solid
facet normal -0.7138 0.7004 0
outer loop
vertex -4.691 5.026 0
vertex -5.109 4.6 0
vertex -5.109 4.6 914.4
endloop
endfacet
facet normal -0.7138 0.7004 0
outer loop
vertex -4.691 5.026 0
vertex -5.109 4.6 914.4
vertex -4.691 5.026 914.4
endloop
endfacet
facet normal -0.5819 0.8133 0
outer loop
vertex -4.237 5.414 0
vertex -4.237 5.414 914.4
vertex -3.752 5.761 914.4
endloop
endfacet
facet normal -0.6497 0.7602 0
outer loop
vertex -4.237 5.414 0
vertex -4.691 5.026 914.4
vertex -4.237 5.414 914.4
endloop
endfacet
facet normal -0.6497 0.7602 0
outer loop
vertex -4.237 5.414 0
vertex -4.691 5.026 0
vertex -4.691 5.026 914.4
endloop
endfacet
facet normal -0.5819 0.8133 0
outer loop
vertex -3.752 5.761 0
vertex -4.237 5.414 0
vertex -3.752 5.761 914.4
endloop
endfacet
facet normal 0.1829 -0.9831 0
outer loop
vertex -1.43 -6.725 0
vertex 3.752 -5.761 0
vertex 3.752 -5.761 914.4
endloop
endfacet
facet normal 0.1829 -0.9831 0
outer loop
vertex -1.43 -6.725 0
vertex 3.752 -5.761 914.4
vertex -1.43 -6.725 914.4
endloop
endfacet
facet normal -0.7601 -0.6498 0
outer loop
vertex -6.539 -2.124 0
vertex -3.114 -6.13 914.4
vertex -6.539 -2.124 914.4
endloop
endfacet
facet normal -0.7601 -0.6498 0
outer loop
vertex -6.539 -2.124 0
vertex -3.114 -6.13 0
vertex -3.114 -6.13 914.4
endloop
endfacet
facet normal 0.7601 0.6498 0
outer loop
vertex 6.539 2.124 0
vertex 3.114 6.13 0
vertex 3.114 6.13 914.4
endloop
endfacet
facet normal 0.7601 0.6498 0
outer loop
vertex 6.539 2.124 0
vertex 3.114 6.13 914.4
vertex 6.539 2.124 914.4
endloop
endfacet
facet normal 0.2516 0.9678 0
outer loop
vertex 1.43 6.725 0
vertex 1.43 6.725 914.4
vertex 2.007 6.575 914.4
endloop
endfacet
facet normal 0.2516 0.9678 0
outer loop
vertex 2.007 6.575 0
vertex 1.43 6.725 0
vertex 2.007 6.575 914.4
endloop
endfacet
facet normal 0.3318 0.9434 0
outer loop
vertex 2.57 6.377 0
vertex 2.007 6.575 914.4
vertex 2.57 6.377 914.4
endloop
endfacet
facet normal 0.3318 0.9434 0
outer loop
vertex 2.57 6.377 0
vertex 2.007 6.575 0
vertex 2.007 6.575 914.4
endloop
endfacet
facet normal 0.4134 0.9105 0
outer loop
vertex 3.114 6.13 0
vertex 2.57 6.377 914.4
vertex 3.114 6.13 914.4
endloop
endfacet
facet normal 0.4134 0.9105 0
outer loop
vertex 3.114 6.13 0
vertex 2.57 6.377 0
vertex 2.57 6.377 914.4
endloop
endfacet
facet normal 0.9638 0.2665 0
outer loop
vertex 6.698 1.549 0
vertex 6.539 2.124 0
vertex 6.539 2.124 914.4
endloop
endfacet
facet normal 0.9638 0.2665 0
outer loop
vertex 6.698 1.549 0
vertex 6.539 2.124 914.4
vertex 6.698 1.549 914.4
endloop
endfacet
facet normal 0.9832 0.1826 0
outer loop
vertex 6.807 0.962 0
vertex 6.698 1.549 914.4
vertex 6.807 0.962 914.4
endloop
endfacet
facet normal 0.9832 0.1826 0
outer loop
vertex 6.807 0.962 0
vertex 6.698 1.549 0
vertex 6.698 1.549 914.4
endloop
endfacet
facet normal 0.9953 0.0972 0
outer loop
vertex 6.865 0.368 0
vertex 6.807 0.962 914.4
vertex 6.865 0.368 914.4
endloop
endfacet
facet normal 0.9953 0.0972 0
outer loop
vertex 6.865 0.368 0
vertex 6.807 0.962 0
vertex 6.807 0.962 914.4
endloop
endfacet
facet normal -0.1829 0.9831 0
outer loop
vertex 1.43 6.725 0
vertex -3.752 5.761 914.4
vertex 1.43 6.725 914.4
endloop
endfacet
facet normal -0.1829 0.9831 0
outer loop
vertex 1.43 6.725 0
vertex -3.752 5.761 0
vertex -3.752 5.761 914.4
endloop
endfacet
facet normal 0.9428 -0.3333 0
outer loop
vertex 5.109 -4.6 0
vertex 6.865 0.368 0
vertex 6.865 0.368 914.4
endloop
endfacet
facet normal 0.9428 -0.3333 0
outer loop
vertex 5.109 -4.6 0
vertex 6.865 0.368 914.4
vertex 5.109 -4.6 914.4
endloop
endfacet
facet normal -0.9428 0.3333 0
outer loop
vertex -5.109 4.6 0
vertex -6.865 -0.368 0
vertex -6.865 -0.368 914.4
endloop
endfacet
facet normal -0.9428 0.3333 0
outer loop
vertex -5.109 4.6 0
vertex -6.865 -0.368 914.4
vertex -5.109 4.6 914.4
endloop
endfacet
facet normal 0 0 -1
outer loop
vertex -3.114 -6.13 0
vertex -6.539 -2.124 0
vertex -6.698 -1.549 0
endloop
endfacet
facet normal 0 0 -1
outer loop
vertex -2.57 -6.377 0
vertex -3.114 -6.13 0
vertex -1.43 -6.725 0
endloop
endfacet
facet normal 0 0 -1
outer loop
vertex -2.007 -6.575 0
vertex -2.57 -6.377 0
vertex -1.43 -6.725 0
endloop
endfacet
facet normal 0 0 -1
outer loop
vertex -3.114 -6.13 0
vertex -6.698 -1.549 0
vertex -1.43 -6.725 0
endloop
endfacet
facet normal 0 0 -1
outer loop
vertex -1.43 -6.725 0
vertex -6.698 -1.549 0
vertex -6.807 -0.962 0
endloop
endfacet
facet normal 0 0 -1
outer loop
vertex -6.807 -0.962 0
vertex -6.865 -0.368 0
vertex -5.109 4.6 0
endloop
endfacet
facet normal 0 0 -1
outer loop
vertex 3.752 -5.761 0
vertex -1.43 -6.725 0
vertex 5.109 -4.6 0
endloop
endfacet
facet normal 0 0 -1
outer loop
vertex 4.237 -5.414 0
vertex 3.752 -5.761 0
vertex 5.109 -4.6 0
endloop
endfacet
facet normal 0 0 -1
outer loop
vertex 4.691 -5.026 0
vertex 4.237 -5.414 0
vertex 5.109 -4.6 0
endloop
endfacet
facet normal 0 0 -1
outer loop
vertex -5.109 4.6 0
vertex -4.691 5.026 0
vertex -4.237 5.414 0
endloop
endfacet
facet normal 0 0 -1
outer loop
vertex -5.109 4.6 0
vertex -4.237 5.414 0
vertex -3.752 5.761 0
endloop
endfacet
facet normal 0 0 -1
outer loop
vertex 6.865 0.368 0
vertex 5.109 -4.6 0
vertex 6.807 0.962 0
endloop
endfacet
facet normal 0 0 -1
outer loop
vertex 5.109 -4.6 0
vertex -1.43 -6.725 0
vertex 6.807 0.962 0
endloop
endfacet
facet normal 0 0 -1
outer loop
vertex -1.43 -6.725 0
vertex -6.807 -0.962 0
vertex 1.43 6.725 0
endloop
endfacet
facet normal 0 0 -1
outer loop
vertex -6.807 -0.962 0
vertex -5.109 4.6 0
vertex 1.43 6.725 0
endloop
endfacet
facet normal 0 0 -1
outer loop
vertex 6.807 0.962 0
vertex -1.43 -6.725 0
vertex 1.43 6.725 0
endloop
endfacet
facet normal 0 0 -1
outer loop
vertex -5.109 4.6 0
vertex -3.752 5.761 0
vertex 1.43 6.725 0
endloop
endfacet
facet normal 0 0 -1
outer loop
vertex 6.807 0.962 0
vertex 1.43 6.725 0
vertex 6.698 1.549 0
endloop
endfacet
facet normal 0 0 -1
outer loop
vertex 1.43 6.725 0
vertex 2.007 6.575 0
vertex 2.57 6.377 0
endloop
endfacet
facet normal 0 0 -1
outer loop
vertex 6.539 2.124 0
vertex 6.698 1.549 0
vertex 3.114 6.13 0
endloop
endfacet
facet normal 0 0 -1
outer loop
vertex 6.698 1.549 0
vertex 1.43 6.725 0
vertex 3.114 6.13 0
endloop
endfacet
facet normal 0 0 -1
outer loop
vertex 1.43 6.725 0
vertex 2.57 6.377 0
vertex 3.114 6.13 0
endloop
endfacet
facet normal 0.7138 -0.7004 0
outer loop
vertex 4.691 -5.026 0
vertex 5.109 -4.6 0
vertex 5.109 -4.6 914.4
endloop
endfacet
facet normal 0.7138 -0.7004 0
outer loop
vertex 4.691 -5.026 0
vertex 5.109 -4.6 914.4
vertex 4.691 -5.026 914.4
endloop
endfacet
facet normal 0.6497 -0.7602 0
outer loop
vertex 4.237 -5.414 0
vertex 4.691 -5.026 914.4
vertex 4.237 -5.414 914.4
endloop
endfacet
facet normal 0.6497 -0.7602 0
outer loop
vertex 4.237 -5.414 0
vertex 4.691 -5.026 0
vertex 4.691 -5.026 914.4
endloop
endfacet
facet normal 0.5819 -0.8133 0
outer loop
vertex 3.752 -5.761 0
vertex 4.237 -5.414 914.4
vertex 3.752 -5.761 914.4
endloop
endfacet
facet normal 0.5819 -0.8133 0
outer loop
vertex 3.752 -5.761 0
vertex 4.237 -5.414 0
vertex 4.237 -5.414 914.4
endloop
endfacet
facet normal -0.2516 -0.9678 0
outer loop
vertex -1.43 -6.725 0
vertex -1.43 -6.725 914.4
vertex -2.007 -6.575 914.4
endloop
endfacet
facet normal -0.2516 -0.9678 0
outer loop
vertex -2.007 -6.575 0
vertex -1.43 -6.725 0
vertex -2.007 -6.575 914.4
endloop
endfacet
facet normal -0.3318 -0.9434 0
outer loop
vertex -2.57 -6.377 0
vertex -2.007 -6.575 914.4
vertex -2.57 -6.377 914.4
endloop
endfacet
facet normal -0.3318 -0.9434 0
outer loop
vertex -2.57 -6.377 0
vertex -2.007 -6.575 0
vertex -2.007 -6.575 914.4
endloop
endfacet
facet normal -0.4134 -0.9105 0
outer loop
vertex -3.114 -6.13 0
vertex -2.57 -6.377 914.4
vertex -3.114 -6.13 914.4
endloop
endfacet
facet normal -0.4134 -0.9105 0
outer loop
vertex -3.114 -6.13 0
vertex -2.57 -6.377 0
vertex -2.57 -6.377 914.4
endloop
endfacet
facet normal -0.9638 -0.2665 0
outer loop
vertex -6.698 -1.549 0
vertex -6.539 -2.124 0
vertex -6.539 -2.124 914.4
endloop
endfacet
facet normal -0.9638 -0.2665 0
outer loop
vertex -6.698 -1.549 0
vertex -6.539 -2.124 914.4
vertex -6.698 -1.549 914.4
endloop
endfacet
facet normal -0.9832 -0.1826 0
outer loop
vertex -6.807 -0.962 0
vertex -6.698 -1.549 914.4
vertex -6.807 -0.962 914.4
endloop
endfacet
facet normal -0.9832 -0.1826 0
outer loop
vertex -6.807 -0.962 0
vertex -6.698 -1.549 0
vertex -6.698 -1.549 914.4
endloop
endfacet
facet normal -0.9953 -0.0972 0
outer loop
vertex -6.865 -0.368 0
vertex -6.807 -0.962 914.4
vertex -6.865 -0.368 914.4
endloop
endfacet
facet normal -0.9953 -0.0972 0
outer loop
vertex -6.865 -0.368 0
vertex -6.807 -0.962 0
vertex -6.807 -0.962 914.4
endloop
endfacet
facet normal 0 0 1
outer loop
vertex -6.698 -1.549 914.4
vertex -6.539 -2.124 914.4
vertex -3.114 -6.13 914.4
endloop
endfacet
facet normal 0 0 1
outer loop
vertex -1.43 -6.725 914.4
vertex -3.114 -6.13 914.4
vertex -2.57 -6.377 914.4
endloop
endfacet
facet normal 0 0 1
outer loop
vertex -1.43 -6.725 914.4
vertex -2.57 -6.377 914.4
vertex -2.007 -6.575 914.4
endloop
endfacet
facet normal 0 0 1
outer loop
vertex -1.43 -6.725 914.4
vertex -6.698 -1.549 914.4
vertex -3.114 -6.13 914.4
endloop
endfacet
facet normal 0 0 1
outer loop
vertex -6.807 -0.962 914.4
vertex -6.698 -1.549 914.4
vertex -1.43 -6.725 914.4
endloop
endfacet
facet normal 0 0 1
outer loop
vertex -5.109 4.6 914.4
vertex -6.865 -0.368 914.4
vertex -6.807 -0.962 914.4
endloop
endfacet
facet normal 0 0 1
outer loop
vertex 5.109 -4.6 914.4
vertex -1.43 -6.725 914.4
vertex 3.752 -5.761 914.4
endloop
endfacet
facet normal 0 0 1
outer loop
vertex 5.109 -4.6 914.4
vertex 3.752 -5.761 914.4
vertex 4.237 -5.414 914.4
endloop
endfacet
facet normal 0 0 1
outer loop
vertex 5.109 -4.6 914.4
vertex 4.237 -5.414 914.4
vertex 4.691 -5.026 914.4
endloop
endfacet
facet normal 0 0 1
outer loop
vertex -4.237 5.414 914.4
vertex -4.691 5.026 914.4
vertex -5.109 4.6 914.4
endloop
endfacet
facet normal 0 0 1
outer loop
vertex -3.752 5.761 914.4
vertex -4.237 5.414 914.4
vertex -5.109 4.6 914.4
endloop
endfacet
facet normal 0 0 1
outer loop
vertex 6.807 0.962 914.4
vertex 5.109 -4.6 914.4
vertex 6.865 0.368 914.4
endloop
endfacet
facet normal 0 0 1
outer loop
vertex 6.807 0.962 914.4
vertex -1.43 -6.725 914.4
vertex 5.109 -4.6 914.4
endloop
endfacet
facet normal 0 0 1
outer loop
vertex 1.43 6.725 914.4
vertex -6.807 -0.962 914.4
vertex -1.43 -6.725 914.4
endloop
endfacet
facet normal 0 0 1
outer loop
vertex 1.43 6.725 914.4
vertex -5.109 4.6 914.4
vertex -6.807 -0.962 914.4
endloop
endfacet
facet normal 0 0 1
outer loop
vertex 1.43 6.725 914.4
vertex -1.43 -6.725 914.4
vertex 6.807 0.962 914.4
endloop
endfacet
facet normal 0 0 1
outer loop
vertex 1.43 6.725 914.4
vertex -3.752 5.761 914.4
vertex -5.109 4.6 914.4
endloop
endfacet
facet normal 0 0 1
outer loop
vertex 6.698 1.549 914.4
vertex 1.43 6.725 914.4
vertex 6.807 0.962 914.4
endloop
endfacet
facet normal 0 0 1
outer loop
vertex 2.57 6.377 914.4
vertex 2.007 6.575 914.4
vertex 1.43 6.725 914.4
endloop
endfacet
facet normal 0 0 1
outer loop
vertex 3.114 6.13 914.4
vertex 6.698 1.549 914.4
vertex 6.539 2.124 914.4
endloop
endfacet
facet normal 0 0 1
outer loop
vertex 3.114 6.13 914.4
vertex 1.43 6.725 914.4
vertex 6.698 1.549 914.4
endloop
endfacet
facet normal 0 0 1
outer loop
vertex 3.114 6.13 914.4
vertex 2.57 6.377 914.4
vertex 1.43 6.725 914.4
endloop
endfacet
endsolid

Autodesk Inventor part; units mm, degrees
ref_plane "YZ Plane" through (0, 0, 0) normal (1, 0, 0) x (0, 1, 0)
ref_plane "XZ Plane" through (0, 0, 0) normal (0, 1, 0) x (-1, 0, 0)
ref_plane "XY Plane" through (0, 0, 0) normal (0, 0, 1) x (1, 0, 0)
sketch "Sketch1" plane through (0, 0, 0) normal (0, 0, 1) x (1, 0, 0)
  arc A0 (-5.109, 4.6004) -> (-6.8651, -0.3684) centre (0, 0) ccw
  line L0 (-4.7654, 5.5726) -> (-3.7516, 5.7612)
  line L1 (2.4434, 6.9133) -> (3.1135, 6.1296)
  line L2 (7.2087, 1.3406) -> (6.8651, 0.3684)
  line L3 (4.7654, -5.5726) -> (3.7516, -5.7612)
  line L4 (-2.4434, -6.9133) -> (-3.1135, -6.1296)
  line L5 (-7.2087, -1.3406) -> (-6.8651, -0.3684)
  arc A1 (-3.7516, 5.7612) -> (-5.109, 4.6004) centre (0, 0) ccw
  arc A2 (1.4295, 6.7247) -> (-3.7516, 5.7612) centre (0, 0) ccw
  arc A3 (3.1135, 6.1296) -> (1.4295, 6.7247) centre (0, 0) ccw
  arc A4 (6.5386, 2.1243) -> (3.1135, 6.1296) centre (0, 0) ccw
  arc A5 (6.8651, 0.3684) -> (6.5386, 2.1243) centre (0, 0) ccw
  arc A6 (5.109, -4.6004) -> (6.8651, 0.3684) centre (0, 0) ccw
  arc A7 (3.7516, -5.7612) -> (5.109, -4.6004) centre (0, 0) ccw
  arc A8 (-1.4295, -6.7247) -> (3.7516, -5.7612) centre (0, 0) ccw
  arc A9 (-3.1135, -6.1296) -> (-1.4295, -6.7247) centre (0, 0) ccw
  arc A10 (-6.5386, -2.1243) -> (-3.1135, -6.1296) centre (0, 0) ccw
  arc A11 (-6.8651, -0.3684) -> (-6.5386, -2.1243) centre (0, 0) ccw
  line L6 (-5.109, 4.6004) -> (-4.7654, 5.5726)
  line L7 (-6.8651, -0.3684) -> (-5.109, 4.6004)
  line L8 (-6.5386, -2.1243) -> (-7.2087, -1.3406)
  line L9 (-3.1135, -6.1296) -> (-6.5386, -2.1243)
  line L10 (-1.4295, -6.7247) -> (-2.4434, -6.9133)
  line L11 (3.7516, -5.7612) -> (-1.4295, -6.7247)
  line L12 (5.109, -4.6004) -> (4.7654, -5.5726)
  line L13 (6.8651, 0.3684) -> (5.109, -4.6004)
  line L14 (6.5386, 2.1243) -> (7.2087, 1.3406)
  line L15 (3.1135, 6.1296) -> (6.5386, 2.1243)
  line L16 (1.4295, 6.7247) -> (2.4434, 6.9133)
  line L17 (-3.7516, 5.7612) -> (1.4295, 6.7247)
  dimension "d0" = 12.7
  dimension "d1" = 13.75
extrude "Extrusion1" add sketch "Sketch1" along normal blind 914.4 contours A1 L17 A3 L15 A5 L13 A7 L11 A9 L9 A11 L7
properties part number "ThunderHex36"
